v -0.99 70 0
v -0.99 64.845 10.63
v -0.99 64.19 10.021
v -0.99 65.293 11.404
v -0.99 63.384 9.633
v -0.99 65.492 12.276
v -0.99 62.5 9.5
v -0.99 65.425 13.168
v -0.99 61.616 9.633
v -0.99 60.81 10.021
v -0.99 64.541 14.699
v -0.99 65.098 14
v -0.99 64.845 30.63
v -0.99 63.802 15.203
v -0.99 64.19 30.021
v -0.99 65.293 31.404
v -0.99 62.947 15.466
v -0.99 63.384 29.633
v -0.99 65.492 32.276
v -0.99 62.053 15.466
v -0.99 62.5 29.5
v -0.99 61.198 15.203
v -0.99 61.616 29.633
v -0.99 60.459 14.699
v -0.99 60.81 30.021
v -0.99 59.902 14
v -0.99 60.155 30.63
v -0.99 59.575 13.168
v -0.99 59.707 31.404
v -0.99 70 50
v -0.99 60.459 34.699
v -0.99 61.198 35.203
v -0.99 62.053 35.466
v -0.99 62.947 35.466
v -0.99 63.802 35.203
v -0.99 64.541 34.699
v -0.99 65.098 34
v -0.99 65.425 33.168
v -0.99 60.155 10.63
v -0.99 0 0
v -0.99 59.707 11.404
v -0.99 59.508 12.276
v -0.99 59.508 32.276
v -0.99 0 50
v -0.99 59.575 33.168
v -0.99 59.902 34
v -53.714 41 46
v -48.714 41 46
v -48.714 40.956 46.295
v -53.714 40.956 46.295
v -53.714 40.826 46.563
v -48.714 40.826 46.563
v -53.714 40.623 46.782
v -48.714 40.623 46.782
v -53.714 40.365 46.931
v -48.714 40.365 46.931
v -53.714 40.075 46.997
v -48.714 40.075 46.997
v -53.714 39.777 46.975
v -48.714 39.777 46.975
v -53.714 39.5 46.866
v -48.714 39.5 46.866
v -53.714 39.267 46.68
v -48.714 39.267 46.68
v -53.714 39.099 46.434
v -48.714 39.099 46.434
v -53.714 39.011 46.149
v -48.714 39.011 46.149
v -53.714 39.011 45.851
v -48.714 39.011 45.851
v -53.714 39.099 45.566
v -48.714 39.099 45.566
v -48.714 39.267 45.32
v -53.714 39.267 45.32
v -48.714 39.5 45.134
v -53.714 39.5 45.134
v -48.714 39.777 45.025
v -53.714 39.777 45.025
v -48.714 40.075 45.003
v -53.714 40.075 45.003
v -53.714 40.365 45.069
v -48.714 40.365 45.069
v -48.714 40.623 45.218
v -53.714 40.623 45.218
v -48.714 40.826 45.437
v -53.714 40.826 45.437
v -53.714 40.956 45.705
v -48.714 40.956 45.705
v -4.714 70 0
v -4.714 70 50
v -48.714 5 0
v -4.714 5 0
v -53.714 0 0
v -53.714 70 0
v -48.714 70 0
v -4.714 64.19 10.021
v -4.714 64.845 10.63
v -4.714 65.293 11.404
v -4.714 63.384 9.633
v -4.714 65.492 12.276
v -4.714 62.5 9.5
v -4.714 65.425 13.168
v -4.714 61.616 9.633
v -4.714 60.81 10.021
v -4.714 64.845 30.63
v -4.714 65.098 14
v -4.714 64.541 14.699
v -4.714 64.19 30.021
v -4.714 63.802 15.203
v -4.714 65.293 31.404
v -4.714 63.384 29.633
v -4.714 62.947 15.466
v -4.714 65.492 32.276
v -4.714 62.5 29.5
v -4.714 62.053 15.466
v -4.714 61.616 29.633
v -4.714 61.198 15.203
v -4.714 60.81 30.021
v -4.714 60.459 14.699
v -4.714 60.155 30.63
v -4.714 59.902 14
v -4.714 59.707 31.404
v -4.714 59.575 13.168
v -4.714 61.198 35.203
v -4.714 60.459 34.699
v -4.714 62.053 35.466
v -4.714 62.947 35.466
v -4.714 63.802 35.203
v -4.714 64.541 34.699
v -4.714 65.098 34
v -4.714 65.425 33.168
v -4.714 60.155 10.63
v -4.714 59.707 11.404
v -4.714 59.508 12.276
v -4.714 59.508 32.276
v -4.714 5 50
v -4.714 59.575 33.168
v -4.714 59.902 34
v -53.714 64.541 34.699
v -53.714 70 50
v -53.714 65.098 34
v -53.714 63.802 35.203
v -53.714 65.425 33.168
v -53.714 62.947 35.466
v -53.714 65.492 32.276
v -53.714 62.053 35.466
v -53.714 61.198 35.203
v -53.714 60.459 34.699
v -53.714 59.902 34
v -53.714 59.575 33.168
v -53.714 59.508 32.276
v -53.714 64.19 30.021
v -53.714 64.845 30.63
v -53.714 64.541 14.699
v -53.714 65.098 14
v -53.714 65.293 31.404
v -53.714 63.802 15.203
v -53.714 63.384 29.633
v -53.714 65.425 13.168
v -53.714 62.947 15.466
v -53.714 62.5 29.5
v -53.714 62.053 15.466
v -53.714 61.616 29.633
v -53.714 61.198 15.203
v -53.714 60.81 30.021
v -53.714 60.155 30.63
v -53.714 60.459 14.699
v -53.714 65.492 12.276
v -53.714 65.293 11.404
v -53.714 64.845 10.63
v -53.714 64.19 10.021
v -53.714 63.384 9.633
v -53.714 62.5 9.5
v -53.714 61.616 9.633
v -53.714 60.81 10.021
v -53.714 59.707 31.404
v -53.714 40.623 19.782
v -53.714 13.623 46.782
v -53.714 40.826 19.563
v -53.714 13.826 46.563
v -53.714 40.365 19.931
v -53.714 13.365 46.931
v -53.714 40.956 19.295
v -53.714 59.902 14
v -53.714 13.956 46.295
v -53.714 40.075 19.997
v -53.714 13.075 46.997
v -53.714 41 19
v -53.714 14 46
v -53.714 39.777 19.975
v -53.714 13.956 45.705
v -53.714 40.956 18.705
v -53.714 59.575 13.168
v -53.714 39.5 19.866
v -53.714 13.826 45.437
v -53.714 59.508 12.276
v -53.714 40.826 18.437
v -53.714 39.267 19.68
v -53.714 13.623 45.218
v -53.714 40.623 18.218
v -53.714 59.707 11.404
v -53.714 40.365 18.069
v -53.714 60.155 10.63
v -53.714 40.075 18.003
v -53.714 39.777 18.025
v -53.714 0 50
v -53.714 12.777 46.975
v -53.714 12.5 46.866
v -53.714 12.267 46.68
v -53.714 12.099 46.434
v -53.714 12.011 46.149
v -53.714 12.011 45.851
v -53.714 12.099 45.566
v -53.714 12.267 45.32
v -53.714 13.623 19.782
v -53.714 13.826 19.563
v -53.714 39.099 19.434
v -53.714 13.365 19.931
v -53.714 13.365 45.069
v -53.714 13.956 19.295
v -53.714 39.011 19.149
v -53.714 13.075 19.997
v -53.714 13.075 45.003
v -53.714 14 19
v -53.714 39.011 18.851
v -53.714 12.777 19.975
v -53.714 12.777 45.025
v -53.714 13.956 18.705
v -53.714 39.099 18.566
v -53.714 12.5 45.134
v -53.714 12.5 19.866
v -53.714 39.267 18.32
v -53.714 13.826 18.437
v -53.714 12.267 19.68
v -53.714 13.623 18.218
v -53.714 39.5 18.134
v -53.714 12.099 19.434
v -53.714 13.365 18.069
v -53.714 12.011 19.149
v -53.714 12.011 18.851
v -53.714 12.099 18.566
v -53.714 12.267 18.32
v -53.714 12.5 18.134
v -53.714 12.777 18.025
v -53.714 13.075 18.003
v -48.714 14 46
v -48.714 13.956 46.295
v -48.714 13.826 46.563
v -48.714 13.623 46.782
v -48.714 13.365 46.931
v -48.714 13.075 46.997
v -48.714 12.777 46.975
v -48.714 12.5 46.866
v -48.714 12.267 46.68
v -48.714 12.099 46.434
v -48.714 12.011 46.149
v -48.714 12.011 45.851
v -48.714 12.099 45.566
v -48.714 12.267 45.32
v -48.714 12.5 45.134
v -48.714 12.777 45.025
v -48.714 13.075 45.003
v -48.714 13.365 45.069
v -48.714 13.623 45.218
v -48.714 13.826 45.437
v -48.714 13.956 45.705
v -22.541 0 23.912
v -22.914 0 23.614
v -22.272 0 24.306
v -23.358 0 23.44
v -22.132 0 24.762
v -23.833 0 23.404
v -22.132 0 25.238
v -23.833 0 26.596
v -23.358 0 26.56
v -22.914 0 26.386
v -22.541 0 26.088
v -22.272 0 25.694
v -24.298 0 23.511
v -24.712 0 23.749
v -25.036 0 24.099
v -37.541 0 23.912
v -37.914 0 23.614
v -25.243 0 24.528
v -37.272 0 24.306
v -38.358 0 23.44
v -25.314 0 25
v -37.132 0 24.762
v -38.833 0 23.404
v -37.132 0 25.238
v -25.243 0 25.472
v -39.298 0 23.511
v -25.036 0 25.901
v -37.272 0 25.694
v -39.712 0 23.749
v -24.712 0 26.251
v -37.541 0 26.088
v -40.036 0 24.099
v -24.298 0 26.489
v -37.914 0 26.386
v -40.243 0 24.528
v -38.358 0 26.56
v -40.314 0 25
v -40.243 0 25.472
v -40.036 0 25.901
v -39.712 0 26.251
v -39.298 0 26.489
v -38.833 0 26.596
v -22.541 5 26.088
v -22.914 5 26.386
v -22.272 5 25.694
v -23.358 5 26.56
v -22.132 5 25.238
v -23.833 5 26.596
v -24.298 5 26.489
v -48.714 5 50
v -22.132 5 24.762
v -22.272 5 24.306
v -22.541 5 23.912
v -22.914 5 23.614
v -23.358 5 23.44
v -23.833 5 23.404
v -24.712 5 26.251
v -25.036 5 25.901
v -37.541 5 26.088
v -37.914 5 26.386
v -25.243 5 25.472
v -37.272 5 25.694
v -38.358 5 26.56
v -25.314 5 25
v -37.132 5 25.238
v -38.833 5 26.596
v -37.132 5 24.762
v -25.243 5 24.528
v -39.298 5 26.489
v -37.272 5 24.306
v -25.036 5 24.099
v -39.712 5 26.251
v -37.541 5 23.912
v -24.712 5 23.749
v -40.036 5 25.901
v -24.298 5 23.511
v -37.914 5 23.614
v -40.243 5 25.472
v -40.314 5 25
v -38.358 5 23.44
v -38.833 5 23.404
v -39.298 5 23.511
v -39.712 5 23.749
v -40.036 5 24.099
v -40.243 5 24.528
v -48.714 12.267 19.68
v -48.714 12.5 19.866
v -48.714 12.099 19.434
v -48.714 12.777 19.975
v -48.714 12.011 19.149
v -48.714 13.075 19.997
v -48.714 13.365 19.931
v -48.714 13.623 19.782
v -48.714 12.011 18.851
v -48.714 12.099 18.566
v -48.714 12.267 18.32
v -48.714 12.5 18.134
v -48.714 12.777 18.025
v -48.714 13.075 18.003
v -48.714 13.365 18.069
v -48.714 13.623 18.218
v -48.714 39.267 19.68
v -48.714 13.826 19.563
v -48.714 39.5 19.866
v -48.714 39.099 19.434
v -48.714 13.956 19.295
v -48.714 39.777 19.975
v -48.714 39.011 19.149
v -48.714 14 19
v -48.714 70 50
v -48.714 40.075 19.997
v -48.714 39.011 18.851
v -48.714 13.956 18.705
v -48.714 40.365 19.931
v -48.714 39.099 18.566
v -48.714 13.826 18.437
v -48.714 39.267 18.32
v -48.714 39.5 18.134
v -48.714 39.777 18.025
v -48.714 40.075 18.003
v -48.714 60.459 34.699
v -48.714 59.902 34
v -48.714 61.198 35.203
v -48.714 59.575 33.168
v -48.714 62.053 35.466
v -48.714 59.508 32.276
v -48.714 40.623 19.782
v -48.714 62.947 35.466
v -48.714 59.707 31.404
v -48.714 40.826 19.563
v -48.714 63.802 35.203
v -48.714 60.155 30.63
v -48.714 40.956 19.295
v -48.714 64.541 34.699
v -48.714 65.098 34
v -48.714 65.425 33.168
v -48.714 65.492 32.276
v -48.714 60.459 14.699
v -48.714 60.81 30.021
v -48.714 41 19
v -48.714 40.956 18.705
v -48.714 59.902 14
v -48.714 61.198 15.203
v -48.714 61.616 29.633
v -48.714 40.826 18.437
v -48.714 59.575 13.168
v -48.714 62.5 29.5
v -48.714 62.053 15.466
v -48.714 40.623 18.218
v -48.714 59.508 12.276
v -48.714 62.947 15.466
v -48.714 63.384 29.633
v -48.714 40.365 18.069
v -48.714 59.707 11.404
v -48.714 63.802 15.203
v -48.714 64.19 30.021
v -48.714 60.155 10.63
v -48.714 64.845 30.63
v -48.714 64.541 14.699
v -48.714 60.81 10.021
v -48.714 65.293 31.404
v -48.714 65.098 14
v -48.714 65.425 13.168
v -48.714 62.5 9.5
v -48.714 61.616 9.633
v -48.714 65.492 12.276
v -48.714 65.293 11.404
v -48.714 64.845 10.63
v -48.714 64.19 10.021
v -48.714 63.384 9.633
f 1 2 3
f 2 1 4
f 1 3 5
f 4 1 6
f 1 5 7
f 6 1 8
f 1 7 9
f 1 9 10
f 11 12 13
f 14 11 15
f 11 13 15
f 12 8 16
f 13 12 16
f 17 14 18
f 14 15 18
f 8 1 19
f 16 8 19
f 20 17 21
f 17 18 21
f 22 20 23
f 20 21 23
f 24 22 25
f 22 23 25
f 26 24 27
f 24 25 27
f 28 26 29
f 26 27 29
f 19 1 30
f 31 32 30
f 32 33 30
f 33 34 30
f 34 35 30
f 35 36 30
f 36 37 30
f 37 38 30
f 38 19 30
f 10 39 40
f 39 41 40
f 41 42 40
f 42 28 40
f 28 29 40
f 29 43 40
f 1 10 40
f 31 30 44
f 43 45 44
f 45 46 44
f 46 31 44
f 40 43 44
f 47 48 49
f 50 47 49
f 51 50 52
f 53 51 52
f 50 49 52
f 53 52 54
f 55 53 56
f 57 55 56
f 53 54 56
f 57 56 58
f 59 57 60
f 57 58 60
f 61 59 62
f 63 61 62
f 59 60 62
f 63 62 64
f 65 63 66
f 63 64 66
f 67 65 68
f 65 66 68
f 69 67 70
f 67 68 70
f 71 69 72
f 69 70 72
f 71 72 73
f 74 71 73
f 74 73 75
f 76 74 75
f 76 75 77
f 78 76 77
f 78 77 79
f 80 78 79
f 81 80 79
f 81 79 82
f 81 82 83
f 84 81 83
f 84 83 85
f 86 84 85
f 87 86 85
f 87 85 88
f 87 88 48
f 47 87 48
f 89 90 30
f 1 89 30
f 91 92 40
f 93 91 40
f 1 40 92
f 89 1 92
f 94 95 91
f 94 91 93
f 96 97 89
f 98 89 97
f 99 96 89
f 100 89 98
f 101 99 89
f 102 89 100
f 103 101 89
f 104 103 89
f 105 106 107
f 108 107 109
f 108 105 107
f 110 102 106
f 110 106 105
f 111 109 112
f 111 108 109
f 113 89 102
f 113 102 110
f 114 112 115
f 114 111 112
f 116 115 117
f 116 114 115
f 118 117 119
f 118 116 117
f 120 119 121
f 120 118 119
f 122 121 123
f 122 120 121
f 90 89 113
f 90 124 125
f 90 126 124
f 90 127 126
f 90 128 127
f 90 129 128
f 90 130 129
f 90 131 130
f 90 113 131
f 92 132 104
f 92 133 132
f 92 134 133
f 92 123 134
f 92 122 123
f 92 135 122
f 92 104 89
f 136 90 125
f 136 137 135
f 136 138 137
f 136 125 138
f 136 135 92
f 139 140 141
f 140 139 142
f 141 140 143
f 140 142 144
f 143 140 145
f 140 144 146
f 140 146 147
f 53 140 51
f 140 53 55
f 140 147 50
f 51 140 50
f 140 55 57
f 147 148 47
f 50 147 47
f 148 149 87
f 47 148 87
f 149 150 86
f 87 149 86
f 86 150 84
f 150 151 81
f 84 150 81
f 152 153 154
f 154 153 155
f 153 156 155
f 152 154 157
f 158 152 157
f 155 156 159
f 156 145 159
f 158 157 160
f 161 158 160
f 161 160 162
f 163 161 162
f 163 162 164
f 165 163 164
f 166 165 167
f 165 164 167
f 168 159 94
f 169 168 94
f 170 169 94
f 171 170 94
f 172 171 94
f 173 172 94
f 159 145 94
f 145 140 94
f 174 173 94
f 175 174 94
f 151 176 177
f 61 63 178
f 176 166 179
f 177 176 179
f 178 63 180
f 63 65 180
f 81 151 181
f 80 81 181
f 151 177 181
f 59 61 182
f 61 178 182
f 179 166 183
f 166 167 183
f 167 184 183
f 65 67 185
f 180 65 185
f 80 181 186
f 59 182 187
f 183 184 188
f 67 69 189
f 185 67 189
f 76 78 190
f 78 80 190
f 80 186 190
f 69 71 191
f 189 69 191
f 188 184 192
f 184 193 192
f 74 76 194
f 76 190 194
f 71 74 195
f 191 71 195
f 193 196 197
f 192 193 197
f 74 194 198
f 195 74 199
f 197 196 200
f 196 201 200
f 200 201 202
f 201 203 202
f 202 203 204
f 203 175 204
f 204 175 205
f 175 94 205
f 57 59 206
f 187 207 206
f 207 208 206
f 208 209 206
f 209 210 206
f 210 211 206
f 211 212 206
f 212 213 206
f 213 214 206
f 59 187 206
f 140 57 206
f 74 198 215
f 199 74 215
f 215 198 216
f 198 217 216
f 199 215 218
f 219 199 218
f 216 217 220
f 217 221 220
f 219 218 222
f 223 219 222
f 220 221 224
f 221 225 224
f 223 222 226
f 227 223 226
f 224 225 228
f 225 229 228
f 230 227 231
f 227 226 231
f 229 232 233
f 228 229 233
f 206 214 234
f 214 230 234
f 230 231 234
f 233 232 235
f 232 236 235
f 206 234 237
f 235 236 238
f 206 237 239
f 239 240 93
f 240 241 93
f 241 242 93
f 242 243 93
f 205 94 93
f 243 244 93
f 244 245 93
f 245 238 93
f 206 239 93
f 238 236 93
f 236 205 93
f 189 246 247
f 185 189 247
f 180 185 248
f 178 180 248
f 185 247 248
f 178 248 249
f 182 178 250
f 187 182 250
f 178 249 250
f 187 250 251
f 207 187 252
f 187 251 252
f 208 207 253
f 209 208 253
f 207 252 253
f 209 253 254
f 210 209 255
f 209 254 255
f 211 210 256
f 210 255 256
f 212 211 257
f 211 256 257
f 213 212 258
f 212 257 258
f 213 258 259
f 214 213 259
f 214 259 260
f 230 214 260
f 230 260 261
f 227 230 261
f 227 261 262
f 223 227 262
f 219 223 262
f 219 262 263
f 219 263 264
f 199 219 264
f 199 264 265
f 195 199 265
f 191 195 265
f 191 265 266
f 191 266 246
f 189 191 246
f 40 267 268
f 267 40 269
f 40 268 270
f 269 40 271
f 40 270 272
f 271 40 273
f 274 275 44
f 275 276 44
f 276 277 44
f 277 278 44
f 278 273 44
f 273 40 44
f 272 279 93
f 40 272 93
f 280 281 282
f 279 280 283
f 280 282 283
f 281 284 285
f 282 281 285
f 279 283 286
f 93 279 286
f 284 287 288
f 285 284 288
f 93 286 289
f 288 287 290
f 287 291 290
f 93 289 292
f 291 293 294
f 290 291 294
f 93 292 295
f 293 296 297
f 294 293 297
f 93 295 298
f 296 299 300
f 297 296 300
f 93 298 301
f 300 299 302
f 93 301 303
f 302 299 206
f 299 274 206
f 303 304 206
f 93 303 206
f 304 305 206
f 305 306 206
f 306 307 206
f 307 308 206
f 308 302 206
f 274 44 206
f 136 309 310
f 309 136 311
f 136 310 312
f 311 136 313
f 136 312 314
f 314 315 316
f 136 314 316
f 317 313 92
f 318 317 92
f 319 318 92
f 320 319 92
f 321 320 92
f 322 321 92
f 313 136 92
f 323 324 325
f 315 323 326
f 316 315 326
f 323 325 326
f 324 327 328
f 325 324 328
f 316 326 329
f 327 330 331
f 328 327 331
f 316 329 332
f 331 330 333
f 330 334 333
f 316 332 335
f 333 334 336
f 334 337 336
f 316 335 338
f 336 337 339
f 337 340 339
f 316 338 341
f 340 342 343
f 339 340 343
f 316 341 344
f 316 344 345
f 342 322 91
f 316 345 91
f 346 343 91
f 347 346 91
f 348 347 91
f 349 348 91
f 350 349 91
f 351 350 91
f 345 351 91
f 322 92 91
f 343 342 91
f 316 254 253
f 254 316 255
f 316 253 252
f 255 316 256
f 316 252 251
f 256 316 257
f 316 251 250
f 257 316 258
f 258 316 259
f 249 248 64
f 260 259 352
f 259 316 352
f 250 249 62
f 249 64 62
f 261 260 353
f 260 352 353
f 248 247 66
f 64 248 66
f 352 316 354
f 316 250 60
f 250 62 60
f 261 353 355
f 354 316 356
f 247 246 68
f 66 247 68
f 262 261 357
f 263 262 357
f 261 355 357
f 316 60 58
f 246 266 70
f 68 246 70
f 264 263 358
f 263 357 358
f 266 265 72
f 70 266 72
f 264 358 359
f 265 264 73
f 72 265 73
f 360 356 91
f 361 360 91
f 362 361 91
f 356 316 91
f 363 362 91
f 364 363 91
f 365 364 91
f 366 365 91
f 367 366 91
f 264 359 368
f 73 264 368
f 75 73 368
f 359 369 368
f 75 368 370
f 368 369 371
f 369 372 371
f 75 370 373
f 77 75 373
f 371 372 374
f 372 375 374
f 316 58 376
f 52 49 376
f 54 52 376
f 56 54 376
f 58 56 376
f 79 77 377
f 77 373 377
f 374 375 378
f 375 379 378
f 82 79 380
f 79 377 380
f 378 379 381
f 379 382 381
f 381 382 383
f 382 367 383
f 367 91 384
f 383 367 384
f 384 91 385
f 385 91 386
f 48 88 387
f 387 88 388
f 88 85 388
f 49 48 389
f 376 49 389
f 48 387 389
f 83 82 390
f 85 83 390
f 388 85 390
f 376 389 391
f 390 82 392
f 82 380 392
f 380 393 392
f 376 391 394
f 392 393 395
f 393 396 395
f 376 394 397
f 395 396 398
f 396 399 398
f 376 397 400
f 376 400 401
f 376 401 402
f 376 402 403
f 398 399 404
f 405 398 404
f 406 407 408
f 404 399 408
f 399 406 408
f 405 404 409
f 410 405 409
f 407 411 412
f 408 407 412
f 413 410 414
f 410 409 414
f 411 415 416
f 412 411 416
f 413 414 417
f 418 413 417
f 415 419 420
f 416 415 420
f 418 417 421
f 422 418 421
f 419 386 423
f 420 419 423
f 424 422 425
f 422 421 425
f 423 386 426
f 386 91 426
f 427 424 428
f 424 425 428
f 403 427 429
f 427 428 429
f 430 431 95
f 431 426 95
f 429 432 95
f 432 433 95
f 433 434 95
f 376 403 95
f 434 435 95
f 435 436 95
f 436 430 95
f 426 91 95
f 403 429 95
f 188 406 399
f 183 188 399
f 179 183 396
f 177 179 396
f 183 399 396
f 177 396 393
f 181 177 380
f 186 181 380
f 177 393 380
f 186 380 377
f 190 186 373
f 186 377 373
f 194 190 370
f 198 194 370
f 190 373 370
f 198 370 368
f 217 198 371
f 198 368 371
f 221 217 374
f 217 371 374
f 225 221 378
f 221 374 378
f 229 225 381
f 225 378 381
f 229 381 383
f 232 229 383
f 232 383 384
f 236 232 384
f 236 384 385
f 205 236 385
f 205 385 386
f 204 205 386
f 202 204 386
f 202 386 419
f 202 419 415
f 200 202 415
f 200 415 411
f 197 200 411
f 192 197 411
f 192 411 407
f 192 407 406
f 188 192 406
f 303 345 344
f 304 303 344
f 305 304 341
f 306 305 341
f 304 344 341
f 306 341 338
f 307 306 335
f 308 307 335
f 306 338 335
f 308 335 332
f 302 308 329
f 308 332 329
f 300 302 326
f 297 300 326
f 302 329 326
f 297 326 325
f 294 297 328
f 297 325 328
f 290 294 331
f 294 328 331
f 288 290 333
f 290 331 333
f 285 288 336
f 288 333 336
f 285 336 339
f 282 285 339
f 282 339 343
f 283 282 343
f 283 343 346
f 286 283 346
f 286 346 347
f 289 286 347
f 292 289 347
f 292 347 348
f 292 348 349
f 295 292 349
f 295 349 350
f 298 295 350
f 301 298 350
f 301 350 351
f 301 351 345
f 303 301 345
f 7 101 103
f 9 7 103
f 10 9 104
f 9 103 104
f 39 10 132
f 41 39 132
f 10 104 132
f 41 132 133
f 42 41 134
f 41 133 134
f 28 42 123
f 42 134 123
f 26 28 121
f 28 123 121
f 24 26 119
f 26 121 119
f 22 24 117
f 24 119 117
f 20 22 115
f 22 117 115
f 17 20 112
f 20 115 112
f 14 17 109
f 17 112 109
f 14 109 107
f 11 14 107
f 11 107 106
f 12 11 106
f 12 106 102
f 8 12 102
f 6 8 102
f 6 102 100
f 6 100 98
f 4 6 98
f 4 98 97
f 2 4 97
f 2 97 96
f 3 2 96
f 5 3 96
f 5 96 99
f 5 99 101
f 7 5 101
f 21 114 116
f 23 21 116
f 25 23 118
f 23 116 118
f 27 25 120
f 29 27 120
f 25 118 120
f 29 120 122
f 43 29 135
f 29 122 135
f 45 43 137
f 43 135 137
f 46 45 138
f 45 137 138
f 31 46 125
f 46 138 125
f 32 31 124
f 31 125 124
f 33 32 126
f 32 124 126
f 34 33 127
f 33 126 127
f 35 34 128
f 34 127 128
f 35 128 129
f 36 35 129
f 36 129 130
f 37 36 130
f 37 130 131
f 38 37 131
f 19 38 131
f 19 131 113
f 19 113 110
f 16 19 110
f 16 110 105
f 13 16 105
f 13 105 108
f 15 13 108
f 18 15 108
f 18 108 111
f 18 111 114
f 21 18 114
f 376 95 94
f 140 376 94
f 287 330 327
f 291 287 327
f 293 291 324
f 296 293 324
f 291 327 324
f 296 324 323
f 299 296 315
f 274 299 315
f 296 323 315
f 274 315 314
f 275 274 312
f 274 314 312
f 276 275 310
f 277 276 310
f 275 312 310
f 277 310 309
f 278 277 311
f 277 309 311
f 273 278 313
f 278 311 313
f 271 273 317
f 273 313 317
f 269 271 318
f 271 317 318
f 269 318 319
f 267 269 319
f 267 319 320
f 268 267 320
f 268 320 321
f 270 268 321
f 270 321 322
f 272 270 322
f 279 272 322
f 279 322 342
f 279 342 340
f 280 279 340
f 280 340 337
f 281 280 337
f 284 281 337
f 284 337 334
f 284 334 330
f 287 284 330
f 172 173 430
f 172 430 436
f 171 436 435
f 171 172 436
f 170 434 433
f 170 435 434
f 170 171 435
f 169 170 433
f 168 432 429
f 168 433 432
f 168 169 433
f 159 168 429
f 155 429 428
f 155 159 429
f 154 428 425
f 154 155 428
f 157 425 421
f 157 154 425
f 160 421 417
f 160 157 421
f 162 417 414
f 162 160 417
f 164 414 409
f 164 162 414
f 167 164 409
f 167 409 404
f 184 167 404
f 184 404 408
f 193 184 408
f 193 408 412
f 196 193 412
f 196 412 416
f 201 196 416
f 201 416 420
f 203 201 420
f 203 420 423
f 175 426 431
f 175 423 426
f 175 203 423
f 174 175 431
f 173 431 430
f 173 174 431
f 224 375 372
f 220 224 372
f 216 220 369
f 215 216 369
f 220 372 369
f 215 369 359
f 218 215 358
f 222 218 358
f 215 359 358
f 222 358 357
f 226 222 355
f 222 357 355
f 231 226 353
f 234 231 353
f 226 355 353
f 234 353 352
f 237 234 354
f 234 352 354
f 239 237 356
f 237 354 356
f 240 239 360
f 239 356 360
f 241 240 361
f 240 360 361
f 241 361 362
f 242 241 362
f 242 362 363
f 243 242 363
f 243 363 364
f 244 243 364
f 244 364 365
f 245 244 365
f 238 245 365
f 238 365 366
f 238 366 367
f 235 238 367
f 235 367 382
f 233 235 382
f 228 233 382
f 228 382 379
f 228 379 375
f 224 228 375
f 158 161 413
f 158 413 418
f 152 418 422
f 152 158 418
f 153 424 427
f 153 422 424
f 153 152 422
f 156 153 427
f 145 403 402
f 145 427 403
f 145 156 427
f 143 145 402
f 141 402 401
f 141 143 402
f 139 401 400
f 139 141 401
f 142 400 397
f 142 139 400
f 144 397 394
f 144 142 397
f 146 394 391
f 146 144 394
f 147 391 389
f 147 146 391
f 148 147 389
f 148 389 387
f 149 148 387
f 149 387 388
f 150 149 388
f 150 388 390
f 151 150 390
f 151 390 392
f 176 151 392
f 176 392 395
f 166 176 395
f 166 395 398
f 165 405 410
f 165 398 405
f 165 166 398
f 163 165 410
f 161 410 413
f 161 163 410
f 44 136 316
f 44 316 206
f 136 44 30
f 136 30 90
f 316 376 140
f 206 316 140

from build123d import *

# Parameters (mm, degrees)
EXTRUDE_1_DEPTH          = 50
SKETCH_2_R               = 1
CUT_EXTRUDE_1_DEPTH      = 97.622978633
SKETCH_3_R               = 1.6
CUT_EXTRUDE_2_DEPTH      = 99.031557982
CUT_EXTRUDE_3_DEPTH      = 97.622978633
CUT_EXTRUDE_3_DEPTH_BACK = 97.622978633
SKETCH_4_R               = 3
EXTRUDE_2_DEPTH          = 50
SKETCH_6_R               = 3
CUT_EXTRUDE_4_DEPTH      = 100


with BuildPart() as part:
    # ｽｹｯﾁ1 → ﾎﾞｽ - 押し出し1 (new body)
    with BuildSketch(Plane.XY):
        Polygon((-53.713930785, 70), (-53.713930785, 0), (-4.713930785, 0), (-4.713930785, 5), (-48.713930785, 5), (-48.713930785, 70), align=None)
    extrude(amount=EXTRUDE_1_DEPTH)

    # ｽｹｯﾁ2 → ｶｯﾄ - 押し出し1 (cut, through all)
    with BuildSketch(Plane(origin=(-48.713930785, 0, 0), x_dir=(0, 0, -1), z_dir=(1, 0, 0))):
        with Locations(Location((-46, 40, 0), (0, 0, 90))):
            Circle(SKETCH_2_R)
        with Locations(Location((-19, 40, 0), (0, 0, 90))):
            Circle(SKETCH_2_R)
        with Locations(Location((-19, 13, 0), (0, 0, 90))):
            Circle(SKETCH_2_R)
        with Locations(Location((-46, 13, 0), (0, 0, 90))):
            Circle(SKETCH_2_R)
    extrude(amount=-CUT_EXTRUDE_1_DEPTH, mode=Mode.SUBTRACT)

    # ｽｹｯﾁ3 → ｶｯﾄ - 押し出し2 (cut, through all)
    with BuildSketch(Plane(origin=(0, 5, 0), x_dir=(1, 0, 0), z_dir=(0, 1, 0))):
        with Locations(Location((-38.713930785, -25, 0), (0, 0, 180))):
            Circle(SKETCH_3_R)
        with Locations(Location((-23.713930785, -25, 0), (0, 0, 180))):
            Circle(SKETCH_3_R)
    extrude(amount=-CUT_EXTRUDE_2_DEPTH, mode=Mode.SUBTRACT)

    # ｽｹｯﾁ4 → ｶｯﾄ - 押し出し3 (cut, two sides: drawn at the far end of the back side and taken through both)
    with BuildSketch(Plane(origin=(-48.713930785, 0, 0), x_dir=(0, 0, -1), z_dir=(1, 0, 0)).offset(-CUT_EXTRUDE_3_DEPTH_BACK)):
        with Locations((-32.5, 62.5)):
            Circle(SKETCH_4_R)
        with Locations((-12.5, 62.5)):
            Circle(SKETCH_4_R)
    extrude(amount=CUT_EXTRUDE_3_DEPTH + CUT_EXTRUDE_3_DEPTH_BACK, mode=Mode.SUBTRACT)

    # ｽｹｯﾁ5 → ﾎﾞｽ - 押し出し2 (add)
    with BuildSketch(Plane.XY.offset(50)):
        Polygon((-4.713930785, 5), (-4.713930785, 70), (-0.989780717, 70), (-0.989780717, 0), (-4.713930785, 0), align=None)
    extrude(amount=-EXTRUDE_2_DEPTH)

    # ｽｹｯﾁ6 → ｶｯﾄ - 押し出し4 (cut, through all)
    with BuildSketch(Plane.ZY.offset(4.713930785)):
        with Locations(Location((12.5, 62.5, 0), (0, 0, 180))):
            Circle(SKETCH_6_R)
        with Locations(Location((32.5, 62.5, 0), (0, 0, 180))):
            Circle(SKETCH_6_R)
    extrude(amount=-CUT_EXTRUDE_4_DEPTH, mode=Mode.SUBTRACT)


solid = part.part
